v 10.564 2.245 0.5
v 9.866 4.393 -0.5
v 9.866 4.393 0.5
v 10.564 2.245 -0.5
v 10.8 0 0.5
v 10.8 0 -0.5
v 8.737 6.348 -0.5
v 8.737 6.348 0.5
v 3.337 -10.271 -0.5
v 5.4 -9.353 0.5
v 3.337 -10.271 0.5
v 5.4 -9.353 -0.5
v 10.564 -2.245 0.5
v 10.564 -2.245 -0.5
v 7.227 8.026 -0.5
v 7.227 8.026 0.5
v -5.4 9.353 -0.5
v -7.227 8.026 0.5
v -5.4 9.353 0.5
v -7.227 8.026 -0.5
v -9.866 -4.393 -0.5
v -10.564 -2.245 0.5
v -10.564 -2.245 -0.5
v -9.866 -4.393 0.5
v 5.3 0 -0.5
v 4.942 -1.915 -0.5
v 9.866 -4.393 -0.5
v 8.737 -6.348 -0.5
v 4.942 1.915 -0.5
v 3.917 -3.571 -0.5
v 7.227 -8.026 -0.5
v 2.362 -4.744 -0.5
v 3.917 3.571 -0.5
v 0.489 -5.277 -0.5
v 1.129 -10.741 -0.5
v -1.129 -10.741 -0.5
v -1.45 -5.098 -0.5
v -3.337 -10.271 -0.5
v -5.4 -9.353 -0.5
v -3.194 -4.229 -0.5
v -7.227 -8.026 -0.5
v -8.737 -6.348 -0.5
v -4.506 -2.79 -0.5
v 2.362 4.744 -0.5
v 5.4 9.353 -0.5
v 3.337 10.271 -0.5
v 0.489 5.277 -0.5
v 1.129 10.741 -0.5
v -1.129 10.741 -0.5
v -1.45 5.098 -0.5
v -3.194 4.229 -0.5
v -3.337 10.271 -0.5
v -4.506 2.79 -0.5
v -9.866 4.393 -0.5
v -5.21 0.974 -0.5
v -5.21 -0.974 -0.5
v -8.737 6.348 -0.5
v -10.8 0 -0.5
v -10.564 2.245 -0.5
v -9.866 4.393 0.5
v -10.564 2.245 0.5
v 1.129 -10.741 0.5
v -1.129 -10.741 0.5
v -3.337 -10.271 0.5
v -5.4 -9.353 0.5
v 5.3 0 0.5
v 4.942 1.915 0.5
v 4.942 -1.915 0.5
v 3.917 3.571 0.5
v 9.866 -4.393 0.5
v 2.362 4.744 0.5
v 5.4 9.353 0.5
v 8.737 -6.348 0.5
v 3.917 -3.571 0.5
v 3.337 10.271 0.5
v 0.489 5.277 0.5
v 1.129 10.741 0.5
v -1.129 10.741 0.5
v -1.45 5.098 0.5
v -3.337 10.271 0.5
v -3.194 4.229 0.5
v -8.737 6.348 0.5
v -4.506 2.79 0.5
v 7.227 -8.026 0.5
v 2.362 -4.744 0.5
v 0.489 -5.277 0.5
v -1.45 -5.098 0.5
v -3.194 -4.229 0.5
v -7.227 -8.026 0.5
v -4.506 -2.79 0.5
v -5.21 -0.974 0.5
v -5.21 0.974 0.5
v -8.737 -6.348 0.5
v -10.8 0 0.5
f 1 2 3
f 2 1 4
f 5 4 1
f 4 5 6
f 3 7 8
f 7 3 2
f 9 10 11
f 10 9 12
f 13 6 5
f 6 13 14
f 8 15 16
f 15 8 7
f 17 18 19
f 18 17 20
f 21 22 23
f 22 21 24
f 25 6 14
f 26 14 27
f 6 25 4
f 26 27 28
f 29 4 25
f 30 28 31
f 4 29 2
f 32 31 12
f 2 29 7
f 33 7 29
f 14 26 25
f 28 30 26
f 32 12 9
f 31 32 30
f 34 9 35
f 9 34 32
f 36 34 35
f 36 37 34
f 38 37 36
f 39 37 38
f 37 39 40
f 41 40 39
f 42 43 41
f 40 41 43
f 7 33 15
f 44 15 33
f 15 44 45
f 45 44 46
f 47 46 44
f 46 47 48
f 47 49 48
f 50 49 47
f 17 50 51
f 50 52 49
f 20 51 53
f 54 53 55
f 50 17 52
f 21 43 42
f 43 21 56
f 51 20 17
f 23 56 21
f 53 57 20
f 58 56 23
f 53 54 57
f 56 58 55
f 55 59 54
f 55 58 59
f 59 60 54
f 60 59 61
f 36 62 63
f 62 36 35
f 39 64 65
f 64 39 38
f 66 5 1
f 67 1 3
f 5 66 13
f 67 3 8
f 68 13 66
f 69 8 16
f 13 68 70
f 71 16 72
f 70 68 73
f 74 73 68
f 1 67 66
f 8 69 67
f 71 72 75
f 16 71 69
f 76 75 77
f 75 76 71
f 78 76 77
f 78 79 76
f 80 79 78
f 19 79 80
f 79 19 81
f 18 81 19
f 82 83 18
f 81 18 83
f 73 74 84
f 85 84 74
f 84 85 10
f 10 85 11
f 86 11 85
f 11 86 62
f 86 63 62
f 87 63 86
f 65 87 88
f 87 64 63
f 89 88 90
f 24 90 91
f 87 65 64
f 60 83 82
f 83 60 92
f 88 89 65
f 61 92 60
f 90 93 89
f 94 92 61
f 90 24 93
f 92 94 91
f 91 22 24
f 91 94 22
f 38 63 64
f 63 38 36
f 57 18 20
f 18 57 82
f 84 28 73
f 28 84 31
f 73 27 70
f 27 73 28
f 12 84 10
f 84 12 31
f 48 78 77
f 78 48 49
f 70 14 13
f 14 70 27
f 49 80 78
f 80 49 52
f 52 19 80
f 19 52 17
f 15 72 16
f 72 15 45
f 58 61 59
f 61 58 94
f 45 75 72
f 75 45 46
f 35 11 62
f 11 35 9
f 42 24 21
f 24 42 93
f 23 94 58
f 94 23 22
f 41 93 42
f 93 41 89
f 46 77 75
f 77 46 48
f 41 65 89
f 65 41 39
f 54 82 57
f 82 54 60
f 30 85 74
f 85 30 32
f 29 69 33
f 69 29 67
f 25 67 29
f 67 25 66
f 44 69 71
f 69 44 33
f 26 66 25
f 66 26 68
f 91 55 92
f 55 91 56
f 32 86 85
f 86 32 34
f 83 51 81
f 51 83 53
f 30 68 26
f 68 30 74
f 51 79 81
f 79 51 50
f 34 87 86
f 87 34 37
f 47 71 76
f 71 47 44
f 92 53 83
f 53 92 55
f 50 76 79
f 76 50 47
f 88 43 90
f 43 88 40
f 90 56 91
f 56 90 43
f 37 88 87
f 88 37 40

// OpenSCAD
// Parameters
r_outer = 10.8; //[5.4:21.6:0.1]
r_inner = 5.3; //[2.65:10.6:0.1]
height = 1; //[0.5:2:0.1]
overlap = 1; //[0.5:2:0.1]

// Geometry
module radial_body_outer() {
  cylinder(r=r_outer, h=height, center=true);
}

module radial_body_inner_cut() {
  cylinder(r=r_inner, h=height + 2*overlap, center=true);
}

// Final Output
difference() {
  radial_body_outer();
  radial_body_inner_cut();
}
